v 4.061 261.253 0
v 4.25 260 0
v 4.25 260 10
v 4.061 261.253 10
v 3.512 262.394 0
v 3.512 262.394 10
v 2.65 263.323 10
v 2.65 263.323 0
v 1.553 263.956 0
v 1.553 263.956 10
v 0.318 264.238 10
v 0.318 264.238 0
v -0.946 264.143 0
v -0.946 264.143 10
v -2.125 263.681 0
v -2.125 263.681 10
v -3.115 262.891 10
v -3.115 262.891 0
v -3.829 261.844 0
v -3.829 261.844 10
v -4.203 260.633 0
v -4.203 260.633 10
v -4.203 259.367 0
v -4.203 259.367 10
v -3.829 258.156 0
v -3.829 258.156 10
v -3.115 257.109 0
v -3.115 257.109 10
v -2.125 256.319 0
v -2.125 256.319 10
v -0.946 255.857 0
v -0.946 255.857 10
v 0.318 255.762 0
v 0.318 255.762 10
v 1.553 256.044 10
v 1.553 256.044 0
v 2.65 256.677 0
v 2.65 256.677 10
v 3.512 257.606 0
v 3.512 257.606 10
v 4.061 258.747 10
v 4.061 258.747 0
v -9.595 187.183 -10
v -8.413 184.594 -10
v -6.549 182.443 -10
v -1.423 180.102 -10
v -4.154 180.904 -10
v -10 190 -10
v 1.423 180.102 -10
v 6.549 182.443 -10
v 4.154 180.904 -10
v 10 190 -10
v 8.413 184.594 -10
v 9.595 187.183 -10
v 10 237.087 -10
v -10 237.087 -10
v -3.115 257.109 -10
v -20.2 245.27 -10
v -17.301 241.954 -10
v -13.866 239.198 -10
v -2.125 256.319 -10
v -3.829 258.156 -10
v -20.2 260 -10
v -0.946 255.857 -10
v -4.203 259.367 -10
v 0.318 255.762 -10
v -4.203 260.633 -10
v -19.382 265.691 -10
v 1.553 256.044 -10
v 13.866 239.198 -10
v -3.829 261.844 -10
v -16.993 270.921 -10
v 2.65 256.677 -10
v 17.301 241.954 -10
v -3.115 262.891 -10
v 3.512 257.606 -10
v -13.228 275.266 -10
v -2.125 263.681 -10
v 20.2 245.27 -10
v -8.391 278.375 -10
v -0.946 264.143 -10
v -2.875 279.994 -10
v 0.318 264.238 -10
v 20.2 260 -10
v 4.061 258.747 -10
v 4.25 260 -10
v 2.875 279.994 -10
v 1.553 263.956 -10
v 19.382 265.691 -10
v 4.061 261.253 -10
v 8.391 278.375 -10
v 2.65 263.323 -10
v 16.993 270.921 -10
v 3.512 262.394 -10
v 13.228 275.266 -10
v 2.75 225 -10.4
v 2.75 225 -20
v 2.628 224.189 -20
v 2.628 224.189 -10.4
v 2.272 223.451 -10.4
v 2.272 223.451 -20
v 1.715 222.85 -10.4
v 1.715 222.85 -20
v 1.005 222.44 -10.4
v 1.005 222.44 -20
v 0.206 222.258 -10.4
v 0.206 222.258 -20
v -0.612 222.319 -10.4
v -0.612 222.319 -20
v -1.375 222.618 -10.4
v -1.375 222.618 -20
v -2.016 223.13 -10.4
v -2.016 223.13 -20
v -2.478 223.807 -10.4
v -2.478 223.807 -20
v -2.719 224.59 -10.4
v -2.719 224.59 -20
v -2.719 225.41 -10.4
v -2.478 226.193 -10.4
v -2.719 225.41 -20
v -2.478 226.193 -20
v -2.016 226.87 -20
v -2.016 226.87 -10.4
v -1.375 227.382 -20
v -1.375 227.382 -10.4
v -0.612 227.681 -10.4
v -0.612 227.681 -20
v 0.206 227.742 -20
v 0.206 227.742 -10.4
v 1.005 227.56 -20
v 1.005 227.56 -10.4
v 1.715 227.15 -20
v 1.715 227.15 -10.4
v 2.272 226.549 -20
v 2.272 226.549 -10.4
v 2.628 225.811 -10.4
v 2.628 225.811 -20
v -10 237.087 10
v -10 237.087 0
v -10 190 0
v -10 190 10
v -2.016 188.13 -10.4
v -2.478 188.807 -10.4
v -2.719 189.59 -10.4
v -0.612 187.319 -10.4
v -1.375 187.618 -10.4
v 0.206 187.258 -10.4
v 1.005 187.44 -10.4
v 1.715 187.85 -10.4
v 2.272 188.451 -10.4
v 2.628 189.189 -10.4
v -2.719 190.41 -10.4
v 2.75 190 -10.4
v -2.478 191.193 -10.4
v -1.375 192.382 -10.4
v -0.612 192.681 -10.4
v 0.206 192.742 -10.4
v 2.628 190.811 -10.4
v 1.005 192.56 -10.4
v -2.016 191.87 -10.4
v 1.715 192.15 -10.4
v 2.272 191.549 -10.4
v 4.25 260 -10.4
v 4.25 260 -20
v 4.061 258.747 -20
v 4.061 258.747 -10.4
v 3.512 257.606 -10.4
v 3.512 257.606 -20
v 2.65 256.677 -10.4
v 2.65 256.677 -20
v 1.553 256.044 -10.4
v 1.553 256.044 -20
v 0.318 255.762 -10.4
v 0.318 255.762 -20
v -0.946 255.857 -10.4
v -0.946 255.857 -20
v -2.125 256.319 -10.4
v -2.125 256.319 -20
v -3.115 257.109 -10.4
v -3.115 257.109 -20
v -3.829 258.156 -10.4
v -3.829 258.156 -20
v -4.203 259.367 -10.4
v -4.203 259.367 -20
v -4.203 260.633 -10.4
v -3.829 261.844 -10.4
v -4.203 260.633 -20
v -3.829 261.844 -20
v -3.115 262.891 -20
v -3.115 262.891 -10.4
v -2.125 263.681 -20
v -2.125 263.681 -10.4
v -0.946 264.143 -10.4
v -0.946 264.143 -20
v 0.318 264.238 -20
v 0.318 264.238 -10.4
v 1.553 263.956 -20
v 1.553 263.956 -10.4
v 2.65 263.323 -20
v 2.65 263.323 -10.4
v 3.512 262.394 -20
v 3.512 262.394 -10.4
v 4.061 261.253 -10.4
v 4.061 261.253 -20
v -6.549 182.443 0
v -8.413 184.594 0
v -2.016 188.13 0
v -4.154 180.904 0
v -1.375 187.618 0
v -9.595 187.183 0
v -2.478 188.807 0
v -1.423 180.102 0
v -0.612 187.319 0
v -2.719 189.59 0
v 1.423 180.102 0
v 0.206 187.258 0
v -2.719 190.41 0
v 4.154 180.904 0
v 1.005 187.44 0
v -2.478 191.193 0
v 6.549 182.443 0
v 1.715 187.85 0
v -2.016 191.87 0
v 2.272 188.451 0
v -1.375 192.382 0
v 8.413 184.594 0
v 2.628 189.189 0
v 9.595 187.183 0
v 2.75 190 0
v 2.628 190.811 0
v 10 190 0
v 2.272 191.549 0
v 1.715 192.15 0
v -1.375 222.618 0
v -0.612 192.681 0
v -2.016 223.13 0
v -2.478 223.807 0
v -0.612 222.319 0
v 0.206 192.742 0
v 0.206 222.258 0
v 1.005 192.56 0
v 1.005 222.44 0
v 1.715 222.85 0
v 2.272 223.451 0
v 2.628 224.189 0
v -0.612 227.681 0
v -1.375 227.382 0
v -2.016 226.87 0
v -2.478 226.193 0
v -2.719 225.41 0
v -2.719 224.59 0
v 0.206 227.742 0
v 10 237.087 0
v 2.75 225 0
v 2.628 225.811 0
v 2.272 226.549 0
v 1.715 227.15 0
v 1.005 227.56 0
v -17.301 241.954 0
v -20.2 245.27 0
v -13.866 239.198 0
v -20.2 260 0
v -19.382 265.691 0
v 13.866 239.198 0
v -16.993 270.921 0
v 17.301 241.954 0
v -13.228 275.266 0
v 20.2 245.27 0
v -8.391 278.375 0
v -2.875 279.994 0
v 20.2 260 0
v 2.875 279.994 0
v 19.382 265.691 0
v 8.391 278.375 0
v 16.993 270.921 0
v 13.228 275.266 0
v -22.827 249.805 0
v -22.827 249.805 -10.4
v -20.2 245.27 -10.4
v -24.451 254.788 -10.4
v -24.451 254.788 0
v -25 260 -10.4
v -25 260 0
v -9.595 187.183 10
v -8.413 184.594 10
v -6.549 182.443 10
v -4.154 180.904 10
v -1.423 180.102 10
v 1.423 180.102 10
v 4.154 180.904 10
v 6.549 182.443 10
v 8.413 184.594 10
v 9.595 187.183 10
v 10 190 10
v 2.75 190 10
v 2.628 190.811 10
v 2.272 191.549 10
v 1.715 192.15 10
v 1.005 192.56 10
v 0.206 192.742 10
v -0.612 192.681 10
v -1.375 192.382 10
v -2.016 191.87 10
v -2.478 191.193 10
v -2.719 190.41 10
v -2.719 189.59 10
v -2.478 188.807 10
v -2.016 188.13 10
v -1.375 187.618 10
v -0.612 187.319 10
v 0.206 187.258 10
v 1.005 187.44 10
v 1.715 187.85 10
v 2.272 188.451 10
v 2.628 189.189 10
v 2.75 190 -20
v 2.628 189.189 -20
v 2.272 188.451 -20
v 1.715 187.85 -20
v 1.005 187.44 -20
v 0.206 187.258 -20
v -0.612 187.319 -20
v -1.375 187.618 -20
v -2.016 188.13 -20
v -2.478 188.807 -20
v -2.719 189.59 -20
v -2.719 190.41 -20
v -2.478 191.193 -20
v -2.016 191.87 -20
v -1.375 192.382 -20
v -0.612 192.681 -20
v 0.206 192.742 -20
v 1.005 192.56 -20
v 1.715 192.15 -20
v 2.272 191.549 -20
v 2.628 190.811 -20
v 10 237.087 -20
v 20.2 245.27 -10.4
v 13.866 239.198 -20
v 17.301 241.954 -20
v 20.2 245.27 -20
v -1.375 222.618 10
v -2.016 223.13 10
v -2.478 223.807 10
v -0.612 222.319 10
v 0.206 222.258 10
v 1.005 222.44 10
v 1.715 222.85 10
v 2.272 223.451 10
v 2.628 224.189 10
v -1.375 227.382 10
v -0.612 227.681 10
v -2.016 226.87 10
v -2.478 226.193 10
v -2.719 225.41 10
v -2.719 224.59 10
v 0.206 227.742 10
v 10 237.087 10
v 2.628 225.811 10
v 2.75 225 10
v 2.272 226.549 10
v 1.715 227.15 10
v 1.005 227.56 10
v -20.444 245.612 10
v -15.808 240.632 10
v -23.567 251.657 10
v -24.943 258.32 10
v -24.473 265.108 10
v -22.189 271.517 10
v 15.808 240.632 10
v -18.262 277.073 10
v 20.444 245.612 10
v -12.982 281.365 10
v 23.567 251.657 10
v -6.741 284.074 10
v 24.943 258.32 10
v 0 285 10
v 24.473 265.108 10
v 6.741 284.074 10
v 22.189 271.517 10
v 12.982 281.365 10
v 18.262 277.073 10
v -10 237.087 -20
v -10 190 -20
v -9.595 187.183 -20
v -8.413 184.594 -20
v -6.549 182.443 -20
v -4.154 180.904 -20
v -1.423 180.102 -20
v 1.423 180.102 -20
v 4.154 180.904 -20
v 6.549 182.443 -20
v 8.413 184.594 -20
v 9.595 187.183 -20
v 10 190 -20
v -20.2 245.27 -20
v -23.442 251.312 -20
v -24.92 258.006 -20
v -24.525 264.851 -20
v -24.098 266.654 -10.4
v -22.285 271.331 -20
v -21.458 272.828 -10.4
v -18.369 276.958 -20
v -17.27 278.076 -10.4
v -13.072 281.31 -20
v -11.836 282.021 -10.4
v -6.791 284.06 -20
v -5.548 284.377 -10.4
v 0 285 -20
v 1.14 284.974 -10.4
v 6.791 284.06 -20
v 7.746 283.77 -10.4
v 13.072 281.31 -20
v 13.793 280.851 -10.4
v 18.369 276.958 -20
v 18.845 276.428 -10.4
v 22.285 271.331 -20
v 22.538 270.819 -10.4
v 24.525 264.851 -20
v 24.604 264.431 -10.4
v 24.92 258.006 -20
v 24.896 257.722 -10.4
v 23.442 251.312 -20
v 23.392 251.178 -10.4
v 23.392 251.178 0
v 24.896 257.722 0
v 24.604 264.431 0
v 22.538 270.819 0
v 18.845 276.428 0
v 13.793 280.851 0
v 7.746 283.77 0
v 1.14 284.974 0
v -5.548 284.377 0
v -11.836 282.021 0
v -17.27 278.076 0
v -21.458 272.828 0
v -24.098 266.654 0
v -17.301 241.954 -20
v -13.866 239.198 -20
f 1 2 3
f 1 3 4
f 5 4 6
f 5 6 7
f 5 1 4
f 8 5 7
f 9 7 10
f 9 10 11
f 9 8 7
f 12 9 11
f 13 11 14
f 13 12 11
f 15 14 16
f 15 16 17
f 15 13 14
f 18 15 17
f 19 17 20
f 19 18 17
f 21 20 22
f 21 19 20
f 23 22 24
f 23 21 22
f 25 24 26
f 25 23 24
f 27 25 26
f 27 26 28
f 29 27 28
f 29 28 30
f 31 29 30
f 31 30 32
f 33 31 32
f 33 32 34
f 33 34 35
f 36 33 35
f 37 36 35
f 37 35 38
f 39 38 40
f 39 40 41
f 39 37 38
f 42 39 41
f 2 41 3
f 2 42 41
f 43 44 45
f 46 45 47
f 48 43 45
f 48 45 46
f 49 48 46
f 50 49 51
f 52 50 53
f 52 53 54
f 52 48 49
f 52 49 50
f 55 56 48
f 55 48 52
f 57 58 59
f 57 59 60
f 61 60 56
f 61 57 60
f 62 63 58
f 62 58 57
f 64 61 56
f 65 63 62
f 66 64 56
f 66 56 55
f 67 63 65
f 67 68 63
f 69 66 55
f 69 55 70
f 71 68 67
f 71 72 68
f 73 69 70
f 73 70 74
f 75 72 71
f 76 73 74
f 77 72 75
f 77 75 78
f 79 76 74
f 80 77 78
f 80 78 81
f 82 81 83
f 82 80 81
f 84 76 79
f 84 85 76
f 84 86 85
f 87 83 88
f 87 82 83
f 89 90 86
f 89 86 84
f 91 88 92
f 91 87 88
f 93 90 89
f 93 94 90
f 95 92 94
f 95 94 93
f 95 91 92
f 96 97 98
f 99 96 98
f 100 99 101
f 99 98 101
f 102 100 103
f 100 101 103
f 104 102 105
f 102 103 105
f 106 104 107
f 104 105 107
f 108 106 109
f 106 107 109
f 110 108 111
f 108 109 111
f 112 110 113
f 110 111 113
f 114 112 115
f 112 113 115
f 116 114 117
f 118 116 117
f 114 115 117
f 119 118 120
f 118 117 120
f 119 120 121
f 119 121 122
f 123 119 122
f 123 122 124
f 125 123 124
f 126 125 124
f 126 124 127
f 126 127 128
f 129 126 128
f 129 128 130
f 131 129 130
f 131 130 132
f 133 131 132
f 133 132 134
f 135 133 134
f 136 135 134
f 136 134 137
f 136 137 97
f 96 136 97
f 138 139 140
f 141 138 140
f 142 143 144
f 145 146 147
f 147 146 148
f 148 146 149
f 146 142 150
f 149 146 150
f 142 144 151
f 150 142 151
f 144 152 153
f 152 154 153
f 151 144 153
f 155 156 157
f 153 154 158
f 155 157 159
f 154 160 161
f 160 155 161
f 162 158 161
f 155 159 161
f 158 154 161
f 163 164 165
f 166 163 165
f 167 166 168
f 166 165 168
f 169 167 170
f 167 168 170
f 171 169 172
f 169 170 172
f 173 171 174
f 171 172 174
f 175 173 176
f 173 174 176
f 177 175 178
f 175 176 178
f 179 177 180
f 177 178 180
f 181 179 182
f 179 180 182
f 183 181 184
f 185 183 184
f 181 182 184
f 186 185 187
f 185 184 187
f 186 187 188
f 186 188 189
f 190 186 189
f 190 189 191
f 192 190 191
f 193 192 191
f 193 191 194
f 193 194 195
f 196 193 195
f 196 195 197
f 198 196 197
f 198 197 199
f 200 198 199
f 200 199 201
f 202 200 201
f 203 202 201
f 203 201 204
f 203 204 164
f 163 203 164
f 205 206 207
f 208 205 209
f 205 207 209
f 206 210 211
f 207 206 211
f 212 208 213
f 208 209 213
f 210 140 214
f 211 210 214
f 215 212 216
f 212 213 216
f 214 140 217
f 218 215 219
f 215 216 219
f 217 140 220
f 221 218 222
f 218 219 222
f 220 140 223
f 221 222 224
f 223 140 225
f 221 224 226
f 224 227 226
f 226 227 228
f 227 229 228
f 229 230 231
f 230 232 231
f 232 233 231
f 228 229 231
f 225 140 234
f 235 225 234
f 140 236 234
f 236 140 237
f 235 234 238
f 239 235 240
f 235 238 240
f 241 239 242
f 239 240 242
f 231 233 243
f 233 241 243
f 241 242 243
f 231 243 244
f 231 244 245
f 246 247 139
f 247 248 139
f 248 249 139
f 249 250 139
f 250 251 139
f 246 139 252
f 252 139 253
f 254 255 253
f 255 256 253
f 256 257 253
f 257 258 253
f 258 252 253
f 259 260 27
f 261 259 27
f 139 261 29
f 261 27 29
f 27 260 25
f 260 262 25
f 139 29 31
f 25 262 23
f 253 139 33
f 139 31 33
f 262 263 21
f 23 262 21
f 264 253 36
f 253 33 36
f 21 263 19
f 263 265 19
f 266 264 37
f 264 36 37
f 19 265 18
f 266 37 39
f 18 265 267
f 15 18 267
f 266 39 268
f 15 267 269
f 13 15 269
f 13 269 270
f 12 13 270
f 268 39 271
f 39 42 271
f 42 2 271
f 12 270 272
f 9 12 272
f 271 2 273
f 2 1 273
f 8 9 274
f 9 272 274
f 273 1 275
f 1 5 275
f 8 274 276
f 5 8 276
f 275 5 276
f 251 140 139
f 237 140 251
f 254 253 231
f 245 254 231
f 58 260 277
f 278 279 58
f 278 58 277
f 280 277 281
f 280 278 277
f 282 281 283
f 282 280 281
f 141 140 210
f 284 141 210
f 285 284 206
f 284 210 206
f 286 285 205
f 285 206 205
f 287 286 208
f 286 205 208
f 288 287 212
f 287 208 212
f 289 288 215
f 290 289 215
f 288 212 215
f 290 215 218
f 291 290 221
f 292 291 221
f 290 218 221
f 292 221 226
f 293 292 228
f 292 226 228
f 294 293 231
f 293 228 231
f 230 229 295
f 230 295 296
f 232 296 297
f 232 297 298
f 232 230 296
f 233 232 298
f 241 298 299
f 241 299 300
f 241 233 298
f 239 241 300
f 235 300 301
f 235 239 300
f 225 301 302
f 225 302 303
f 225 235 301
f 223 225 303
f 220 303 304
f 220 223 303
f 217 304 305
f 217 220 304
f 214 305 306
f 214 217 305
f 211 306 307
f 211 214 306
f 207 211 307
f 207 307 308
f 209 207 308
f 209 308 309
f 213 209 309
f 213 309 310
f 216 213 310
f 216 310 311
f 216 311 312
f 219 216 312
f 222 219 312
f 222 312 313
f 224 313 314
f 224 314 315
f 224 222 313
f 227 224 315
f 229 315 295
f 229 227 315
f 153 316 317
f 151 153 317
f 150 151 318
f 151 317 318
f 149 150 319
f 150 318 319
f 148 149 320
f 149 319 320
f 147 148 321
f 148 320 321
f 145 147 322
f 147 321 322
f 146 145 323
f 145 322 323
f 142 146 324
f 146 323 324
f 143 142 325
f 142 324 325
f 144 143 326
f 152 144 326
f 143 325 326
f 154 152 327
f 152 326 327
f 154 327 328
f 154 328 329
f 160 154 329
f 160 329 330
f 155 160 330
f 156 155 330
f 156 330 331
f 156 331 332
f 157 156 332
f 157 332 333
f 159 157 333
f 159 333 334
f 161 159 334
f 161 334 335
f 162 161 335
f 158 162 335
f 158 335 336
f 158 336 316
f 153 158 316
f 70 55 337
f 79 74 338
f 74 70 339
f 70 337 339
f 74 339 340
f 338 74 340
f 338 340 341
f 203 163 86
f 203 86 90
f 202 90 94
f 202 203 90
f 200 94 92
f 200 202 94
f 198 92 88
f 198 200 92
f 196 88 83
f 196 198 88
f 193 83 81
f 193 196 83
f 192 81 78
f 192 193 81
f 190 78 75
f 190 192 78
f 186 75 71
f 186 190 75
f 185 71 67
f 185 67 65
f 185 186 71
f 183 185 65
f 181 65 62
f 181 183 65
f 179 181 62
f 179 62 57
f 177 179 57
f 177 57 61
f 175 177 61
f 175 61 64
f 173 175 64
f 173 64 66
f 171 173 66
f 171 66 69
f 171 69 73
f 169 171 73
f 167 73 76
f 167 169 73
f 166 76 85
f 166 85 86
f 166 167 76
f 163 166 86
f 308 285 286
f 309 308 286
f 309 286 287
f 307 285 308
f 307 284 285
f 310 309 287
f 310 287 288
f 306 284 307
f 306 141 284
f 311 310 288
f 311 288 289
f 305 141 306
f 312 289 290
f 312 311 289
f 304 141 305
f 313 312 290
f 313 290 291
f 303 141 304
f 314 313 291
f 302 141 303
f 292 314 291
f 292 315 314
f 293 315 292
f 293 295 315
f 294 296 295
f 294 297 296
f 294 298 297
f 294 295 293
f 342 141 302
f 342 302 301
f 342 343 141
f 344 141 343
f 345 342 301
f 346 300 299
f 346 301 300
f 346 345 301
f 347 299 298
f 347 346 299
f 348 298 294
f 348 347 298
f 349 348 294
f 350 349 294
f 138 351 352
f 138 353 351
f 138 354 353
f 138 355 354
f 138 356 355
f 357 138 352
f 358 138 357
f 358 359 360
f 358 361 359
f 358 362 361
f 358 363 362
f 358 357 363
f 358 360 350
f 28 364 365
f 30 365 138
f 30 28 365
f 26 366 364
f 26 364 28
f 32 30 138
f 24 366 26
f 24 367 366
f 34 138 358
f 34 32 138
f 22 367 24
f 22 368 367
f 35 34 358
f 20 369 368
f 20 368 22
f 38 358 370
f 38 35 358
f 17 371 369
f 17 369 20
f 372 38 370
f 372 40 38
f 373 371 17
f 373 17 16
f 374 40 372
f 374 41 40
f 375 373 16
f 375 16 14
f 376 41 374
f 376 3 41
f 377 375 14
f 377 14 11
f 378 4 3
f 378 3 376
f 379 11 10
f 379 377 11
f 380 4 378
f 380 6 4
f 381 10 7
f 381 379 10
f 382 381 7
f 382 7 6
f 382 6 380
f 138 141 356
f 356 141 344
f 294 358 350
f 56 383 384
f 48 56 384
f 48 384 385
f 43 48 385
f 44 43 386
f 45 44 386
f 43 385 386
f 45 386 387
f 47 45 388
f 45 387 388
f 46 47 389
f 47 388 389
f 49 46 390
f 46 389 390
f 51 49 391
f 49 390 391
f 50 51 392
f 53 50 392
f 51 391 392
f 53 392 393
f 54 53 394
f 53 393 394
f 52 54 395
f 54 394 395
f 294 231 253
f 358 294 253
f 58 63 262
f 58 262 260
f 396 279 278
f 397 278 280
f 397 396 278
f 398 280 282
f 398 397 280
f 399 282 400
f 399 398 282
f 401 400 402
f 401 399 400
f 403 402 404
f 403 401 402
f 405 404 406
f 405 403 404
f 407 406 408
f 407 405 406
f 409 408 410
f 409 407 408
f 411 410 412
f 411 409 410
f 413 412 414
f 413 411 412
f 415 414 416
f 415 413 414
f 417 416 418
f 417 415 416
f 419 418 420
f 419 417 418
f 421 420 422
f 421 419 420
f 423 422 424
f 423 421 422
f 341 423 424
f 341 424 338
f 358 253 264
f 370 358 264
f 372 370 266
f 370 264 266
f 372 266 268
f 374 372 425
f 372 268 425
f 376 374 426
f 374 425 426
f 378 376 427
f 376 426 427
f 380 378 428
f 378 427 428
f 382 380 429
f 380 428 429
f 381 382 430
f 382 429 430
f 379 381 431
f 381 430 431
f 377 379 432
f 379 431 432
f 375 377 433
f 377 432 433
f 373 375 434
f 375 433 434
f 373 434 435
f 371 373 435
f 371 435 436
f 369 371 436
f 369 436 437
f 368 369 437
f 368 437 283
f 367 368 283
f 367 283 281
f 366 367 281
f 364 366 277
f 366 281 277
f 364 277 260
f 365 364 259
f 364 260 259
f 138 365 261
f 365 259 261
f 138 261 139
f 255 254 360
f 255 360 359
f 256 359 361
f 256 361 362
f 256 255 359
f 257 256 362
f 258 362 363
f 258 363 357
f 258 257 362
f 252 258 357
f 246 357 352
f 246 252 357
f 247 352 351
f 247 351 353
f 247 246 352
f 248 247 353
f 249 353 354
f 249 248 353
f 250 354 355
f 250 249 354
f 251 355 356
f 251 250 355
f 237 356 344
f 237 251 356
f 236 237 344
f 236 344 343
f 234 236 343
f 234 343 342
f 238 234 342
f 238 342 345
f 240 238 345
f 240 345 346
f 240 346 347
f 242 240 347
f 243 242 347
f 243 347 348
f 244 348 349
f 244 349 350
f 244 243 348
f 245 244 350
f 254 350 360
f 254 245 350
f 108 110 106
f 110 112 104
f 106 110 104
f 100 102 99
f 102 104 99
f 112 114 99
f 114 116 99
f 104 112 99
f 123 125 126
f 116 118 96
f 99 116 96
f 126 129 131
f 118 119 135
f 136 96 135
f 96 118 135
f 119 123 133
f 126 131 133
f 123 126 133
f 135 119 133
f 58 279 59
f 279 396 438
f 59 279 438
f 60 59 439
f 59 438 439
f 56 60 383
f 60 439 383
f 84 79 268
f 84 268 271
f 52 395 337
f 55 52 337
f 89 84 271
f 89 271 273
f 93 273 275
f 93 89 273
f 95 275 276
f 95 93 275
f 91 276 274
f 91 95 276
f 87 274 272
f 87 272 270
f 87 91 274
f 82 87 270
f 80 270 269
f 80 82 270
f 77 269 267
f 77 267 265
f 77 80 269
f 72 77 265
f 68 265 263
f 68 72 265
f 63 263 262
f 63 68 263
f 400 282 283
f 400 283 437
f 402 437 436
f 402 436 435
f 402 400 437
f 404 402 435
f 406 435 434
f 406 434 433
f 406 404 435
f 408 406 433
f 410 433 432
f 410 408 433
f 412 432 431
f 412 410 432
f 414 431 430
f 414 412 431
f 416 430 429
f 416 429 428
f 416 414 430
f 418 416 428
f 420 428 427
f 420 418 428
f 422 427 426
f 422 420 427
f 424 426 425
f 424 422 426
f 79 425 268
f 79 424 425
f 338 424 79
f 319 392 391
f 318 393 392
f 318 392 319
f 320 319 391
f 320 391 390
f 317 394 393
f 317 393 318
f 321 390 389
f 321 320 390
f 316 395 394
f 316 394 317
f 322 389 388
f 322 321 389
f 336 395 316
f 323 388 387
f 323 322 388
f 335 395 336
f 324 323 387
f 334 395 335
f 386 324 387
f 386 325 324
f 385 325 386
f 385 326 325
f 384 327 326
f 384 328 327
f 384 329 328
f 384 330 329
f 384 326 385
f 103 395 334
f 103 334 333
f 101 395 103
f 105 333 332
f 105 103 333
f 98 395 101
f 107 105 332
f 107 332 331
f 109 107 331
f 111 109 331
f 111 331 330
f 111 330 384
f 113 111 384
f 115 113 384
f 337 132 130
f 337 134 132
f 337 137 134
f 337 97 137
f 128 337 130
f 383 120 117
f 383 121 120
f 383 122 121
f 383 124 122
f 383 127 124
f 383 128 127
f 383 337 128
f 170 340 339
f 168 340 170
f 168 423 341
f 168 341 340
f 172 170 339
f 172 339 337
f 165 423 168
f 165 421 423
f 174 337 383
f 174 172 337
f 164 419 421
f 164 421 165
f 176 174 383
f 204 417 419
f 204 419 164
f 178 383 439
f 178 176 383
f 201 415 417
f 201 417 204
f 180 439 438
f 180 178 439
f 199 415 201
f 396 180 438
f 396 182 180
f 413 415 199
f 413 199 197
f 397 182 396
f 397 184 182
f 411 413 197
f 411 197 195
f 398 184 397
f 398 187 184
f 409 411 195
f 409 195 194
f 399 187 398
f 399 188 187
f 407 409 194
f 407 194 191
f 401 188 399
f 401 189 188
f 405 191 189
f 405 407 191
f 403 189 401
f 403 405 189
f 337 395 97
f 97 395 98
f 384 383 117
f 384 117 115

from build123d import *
from build123d.topology import SkipClean

# Parameters (mm, degrees)
SKETCH2_R           = 4.25
SKETCH2_R_2         = 2.75
BOSS_EXTRUDE1_DEPTH = 10
BOSS_EXTRUDE2_START = 10.4
BOSS_EXTRUDE2_DEPTH = 10.4
BOSS_EXTRUDE3_START = 10.4
SKETCH4_R           = 2.75
SKETCH4_R_2         = 4.25
BOSS_EXTRUDE3_DEPTH = 10.4
SKETCH5_R           = 4.25
BOSS_EXTRUDE4_DEPTH = 0.4
CUT_EXTRUDE2_DEPTH  = 0.4
CUT_EXTRUDE3_DEPTH  = 0.4


with BuildPart() as part:
    # Sketch2 → Boss-Extrude1 (new body)
    with BuildSketch(Plane.XY):
        with BuildLine():
            Line((-10, 237.087121525), (-10, 190))
            ThreePointArc((-10, 190), (0, 180), (10, 190))
            Line((10, 190), (10, 237.087121525))
            ThreePointArc((10, 237.087121525), (0, 285), (-10, 237.087121525))
        make_face()
        with Locations((0, 260)):
            Circle(SKETCH2_R, mode=Mode.SUBTRACT)
        with Locations((0, 225)):
            Circle(SKETCH2_R_2, mode=Mode.SUBTRACT)
        with Locations((0, 190)):
            Circle(SKETCH2_R_2, mode=Mode.SUBTRACT)
    extrude(amount=BOSS_EXTRUDE1_DEPTH)

    # Sketch3 → Boss-Extrude2 (add)
    with BuildSketch(Plane(origin=(0, 0, 0), x_dir=(-1, 0, 0), z_dir=(0, 0, -1)).offset(BOSS_EXTRUDE2_START)):
        with BuildLine():
            Line((-20.2, 245.270437888), (-20.2, 260))
            ThreePointArc((-20.2, 260), (0, 280.2), (20.2, 260))
            Line((20.2, 260), (20.2, 245.270437888))
            ThreePointArc((20.2, 245.270437888), (23.769728648, 252.254033308), (25, 260))
            ThreePointArc((25, 260), (-7.745966692, 283.769728648), (-20.2, 245.270437888))
        make_face()
    extrude(amount=-BOSS_EXTRUDE2_DEPTH)

    # Sketch4 → Boss-Extrude3 (add)
    with BuildSketch(Plane(origin=(0, 0, -10.4), x_dir=(-1, 0, 0), z_dir=(0, 0, -1)).offset(BOSS_EXTRUDE3_START)):
        with BuildLine():
            Line((-10, 237.087121525), (-10, 190))
            ThreePointArc((-10, 190), (0, 180), (10, 190))
            Line((10, 190), (10, 237.087121525))
            ThreePointArc((10, 237.087121525), (0, 285), (-10, 237.087121525))
        make_face()
        with Locations((0, 190)):
            Circle(SKETCH4_R, mode=Mode.SUBTRACT)
        with Locations((0, 225)):
            Circle(SKETCH4_R, mode=Mode.SUBTRACT)
        with Locations((0, 260)):
            Circle(SKETCH4_R_2, mode=Mode.SUBTRACT)
    extrude(amount=-BOSS_EXTRUDE3_DEPTH)

    # Sketch5 → Boss-Extrude4 (add)
    with SkipClean():  # the faces are left unmerged after this step: merging them gives an invalid solid
        with BuildSketch(Plane.XY.offset(-10.4)):
            with BuildLine():
                Line((-20.2, 260), (-20.2, 245.270437888))
                ThreePointArc((-20.2, 245.270437888), (-15.644541114, 240.500042735), (-10, 237.087121525))
                Line((-10, 237.087121525), (-10, 190))
                ThreePointArc((-10, 190), (0, 180), (10, 190))
                Line((10, 190), (10, 237.087121525))
                ThreePointArc((10, 237.087121525), (15.644541114, 240.500042735), (20.2, 245.270437888))
                Line((20.2, 245.270437888), (20.2, 260))
                ThreePointArc((20.2, 260), (0, 280.2), (-20.2, 260))
            make_face()
            with Locations((0, 260)):
                Circle(SKETCH5_R, mode=Mode.SUBTRACT)
        extrude(amount=BOSS_EXTRUDE4_DEPTH)
    add(part.part.scale(1), mode=Mode.REPLACE)  # the faces are merged on a copy

    # Sketch7 → Cut-Extrude2 (cut)
    with BuildSketch(Plane(origin=(0, 0, -20.8), x_dir=(-1, 0, 0), z_dir=(0, 0, -1))):
        with BuildLine():
            Line((-10, 237.087121525), (-10, 190))
            ThreePointArc((-10, 190), (0, 180), (10, 190))
            Line((10, 190), (10, 237.087121525))
            ThreePointArc((10, 237.087121525), (0, 285), (-10, 237.087121525))
        make_face()
    extrude(amount=-CUT_EXTRUDE2_DEPTH, mode=Mode.SUBTRACT)

    # Sketch8 → Cut-Extrude3 (cut)
    with BuildSketch(Plane(origin=(0, 0, -20.4), x_dir=(-1, 0, 0), z_dir=(0, 0, -1))):
        with BuildLine():
            Line((-10, 237.087121525), (-10, 190))
            ThreePointArc((-10, 190), (0, 180), (10, 190))
            Line((10, 190), (10, 237.087121525))
            ThreePointArc((10, 237.087121525), (0, 285), (-10, 237.087121525))
        make_face()
    extrude(amount=-CUT_EXTRUDE3_DEPTH, mode=Mode.SUBTRACT)


solid = part.part
